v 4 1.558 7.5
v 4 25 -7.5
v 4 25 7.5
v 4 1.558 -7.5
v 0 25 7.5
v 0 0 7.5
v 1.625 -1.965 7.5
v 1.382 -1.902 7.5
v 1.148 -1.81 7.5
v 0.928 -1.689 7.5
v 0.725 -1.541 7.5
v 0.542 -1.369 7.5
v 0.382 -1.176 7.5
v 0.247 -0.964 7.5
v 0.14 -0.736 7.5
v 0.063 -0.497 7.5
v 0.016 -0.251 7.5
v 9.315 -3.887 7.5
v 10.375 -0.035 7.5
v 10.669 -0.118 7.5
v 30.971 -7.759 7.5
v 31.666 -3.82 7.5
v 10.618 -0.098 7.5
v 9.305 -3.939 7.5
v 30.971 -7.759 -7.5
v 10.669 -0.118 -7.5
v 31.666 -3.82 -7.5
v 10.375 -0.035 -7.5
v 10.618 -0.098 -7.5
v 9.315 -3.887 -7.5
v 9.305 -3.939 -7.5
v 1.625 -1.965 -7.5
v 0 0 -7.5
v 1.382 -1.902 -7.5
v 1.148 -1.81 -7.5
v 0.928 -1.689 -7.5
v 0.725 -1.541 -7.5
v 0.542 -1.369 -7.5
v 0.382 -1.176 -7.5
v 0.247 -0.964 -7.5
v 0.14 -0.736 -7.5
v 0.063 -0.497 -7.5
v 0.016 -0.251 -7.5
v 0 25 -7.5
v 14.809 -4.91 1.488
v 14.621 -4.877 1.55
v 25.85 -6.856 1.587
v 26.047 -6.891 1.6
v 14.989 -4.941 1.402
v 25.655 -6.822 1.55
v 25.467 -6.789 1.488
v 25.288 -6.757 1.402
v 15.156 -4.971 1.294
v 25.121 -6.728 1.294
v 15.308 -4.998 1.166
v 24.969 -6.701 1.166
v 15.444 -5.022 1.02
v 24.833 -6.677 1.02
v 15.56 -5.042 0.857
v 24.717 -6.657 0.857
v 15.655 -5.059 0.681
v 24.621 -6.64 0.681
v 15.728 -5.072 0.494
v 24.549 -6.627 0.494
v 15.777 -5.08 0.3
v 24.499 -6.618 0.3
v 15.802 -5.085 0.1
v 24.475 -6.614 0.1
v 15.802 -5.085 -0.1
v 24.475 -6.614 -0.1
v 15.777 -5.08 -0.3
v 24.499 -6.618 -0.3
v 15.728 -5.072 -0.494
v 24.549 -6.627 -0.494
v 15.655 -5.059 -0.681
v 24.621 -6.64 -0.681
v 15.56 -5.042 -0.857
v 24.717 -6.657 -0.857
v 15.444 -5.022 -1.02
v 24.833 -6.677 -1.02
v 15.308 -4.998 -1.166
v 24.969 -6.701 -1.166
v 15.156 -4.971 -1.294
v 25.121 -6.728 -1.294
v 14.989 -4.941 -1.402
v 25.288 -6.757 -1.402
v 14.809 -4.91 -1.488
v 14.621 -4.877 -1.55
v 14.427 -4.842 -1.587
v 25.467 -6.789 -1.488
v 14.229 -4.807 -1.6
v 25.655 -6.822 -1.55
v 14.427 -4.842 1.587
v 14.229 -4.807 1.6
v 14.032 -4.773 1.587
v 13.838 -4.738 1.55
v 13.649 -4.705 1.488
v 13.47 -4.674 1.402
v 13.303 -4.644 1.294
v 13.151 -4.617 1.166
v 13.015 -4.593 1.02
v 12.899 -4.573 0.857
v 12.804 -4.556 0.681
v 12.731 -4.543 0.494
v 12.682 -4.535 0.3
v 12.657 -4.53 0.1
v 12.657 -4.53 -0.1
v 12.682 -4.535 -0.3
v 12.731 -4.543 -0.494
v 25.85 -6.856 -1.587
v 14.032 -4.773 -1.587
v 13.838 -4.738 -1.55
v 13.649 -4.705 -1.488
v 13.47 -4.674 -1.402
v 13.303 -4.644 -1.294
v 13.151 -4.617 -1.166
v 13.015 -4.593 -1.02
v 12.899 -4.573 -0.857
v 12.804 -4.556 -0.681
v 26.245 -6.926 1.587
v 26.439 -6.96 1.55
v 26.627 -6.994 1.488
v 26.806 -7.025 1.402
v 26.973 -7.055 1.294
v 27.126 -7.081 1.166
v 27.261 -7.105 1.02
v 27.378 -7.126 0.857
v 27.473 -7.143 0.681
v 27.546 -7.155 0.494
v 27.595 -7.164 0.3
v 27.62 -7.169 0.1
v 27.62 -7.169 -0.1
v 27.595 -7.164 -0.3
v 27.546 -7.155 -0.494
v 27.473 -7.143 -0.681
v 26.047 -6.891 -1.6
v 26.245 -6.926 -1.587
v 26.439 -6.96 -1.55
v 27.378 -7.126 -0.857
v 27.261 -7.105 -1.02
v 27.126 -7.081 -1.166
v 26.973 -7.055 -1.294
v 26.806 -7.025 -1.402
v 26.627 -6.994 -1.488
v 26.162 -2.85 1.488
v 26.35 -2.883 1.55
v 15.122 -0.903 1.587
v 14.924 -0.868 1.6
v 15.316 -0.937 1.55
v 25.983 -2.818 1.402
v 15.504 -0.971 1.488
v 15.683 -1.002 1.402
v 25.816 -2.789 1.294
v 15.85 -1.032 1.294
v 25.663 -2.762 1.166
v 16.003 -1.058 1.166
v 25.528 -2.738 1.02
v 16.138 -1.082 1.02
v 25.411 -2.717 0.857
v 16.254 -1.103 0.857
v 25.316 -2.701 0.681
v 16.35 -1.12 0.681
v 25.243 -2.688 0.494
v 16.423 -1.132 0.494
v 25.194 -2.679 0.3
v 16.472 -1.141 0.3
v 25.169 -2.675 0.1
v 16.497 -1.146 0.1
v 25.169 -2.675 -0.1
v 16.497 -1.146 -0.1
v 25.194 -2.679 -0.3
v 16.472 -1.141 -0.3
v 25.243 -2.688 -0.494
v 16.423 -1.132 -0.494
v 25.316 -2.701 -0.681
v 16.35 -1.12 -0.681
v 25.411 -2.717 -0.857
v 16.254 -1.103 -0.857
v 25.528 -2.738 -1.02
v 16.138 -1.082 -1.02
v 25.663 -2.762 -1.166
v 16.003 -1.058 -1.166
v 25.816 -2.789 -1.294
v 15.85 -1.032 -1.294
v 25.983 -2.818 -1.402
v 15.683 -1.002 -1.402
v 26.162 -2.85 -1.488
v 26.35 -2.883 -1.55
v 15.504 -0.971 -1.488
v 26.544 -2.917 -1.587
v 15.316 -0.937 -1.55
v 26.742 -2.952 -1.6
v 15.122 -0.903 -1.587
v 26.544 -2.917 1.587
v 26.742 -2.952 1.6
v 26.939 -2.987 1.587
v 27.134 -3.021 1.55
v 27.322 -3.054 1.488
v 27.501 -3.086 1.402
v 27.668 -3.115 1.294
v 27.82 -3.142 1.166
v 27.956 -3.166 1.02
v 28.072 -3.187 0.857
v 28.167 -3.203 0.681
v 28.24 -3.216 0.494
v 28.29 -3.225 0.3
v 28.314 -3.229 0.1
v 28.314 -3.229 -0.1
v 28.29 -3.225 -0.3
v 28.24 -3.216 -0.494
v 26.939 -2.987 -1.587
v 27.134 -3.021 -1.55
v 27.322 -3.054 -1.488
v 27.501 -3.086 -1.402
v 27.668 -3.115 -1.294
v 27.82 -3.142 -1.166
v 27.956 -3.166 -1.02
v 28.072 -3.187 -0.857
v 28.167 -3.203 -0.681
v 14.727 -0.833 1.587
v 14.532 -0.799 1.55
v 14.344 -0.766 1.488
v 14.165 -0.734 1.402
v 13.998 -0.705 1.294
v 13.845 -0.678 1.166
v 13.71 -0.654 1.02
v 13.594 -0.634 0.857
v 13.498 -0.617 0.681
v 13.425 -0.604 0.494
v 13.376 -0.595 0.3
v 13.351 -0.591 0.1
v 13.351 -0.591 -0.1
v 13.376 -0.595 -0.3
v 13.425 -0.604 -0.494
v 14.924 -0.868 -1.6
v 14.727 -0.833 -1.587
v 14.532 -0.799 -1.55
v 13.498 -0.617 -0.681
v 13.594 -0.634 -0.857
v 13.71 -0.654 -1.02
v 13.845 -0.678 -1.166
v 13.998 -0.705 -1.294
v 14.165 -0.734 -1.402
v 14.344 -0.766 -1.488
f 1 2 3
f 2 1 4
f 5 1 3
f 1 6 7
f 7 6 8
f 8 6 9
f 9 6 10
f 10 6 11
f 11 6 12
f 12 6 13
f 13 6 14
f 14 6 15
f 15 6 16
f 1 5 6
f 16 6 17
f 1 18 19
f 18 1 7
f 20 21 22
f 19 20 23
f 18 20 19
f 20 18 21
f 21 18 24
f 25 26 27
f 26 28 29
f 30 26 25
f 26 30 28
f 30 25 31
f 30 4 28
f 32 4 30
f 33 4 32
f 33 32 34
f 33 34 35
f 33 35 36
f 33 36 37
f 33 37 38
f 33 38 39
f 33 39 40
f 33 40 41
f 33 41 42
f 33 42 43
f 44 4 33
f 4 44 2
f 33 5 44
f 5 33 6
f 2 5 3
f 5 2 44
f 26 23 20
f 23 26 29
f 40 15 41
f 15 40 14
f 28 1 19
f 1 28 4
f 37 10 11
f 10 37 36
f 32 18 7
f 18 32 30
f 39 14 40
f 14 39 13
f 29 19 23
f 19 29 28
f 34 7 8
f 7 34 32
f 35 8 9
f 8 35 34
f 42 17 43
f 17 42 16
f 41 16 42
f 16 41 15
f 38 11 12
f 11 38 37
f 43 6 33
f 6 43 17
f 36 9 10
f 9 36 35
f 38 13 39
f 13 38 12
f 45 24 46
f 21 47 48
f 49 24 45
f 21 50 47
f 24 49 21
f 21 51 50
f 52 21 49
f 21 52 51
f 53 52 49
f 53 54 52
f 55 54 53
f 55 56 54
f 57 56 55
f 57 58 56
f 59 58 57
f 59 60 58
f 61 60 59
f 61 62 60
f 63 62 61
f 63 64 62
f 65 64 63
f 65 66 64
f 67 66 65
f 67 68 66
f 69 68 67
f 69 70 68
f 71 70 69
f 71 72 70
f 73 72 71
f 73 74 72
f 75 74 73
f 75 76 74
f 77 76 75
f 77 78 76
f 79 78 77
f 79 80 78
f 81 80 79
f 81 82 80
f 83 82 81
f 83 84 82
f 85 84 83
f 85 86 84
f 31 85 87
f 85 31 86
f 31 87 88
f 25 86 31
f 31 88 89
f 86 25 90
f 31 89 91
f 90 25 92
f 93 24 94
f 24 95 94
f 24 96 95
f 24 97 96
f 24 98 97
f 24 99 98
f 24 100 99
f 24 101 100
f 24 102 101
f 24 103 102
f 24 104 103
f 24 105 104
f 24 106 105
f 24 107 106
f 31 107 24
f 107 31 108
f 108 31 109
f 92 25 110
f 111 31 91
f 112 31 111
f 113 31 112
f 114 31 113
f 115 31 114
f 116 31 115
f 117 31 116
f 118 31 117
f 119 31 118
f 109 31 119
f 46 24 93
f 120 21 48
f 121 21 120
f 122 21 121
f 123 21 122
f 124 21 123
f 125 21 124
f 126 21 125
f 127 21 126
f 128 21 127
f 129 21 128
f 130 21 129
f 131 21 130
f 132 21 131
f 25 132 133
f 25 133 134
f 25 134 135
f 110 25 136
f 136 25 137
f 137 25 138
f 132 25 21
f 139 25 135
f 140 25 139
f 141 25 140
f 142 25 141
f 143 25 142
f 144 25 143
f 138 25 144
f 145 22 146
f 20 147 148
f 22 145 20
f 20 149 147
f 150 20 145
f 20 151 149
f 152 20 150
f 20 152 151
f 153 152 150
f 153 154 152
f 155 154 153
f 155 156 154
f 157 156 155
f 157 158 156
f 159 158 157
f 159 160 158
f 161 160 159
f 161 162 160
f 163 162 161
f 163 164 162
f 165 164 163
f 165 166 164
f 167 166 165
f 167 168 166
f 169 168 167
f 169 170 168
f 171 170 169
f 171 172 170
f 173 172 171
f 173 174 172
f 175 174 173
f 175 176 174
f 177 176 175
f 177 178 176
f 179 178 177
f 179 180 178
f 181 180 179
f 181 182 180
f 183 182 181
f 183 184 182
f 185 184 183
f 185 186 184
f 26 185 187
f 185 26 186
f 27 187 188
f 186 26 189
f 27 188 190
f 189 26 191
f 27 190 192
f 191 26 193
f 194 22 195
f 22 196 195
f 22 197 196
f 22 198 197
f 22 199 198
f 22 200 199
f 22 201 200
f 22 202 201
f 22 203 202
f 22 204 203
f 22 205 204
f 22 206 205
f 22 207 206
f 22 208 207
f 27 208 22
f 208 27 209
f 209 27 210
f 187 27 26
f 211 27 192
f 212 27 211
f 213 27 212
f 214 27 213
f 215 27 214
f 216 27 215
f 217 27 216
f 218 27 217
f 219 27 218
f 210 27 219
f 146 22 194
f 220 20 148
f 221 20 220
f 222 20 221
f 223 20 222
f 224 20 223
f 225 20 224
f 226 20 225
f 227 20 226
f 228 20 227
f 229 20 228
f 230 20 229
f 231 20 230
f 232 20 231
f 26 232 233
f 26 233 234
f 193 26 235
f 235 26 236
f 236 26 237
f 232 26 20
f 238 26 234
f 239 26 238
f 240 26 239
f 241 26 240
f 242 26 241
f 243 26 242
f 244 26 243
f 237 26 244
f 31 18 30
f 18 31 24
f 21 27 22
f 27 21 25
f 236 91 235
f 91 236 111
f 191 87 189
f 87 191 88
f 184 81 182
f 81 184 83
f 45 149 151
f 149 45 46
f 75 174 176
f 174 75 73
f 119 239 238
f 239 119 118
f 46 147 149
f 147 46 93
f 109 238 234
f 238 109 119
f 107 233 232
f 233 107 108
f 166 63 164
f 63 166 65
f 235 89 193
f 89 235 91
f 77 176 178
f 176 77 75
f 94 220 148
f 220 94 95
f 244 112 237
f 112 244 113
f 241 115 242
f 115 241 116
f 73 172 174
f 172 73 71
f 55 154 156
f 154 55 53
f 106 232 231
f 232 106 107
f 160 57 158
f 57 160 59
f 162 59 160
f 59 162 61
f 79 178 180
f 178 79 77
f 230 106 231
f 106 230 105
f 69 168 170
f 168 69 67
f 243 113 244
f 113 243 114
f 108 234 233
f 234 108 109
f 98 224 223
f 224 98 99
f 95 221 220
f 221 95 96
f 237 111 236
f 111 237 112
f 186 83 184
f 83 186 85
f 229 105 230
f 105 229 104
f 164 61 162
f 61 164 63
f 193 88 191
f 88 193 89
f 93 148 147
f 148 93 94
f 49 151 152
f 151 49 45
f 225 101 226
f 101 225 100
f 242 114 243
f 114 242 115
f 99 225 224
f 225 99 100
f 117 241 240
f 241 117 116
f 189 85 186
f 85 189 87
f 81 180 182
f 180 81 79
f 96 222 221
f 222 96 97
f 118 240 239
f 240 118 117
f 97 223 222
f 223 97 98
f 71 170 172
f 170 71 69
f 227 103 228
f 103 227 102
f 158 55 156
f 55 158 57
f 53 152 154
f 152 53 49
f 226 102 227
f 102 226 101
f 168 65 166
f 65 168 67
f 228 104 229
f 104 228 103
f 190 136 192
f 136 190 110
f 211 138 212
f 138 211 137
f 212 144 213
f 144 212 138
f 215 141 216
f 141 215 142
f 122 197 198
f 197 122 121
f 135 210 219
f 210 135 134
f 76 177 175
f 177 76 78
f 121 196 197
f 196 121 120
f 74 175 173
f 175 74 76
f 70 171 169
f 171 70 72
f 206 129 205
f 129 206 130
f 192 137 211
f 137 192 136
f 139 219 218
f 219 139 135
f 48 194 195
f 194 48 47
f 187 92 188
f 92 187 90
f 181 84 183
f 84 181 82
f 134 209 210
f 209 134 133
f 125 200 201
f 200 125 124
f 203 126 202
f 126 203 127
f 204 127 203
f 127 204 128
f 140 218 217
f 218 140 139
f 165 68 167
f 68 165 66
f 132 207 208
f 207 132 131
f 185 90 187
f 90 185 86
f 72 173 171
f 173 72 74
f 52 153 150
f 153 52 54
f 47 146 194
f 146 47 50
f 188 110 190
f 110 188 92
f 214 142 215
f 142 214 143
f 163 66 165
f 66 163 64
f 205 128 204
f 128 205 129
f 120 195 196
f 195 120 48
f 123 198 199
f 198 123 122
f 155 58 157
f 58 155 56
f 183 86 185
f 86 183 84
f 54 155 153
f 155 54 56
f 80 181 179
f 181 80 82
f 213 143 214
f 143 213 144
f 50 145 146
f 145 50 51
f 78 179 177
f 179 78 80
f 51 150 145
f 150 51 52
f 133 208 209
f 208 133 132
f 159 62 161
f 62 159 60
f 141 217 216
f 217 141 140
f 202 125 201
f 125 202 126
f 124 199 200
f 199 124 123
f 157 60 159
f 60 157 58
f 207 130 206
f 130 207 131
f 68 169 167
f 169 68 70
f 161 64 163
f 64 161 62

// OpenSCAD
// file: ../parameters.scad
global_clearance = 0.5;

layer_thickness = 0.3;

//Main tube diameter - hole [mm]
main_tube_outer_diameter = 25.4;
main_tube_inner_diameter = 23.05;

// Nastavení parametrů rotoru

gliding_aggle = 14;         // tenhle úhel by se zřejmě v budoucnu měl počítat z požadované klouzavosti.

rotor_blade_AOA = 1.5;      // nastavení úhlu náběhu rotorového listu

// Rotor Auto-G2
rotor_blade_rod = true;  // generovat diru pro uhlikove tycky
rotor_blade_length = 400 - 15;   // délka rotorového listu
rotor_blade_depth = 45.5;     // hloubka rotorového listu


blade_mount_length = 30;

blade_mount_width = 17;
blade_mount_thickness = 4.6;
blade_mount_screw_offset = 5; // distance of first screw from rotor end

// Testovaci maly rotor

        /*
        rotor_blade_rod = false;
        rotor_blade_length = 145;   // délka rotorového listu
        rotor_blade_depth = 45.5 * (145/385);     // hloubka rotorového listu
        blade_mount_length = 20;
        blade_mount_width = 10;
        blade_mount_thickness = 4;
        */

// konec parametru pro testovaci maly rotor

rotor_height = 180;         // výška otočného kloubu rotoru nad hlavní trubkou vírníku (odhad)
rotor_blades_count = 2;
rotor_delta_angle = 12;
rotor_blade_thickness = 5.1;

rotor_blade_naca = 2412;
rotor_blade_parts_count = 3;

blade_transition_length = 10; // length of blade transition

blade_mount_screw_distance = (16.47+11.86)/2;

/* blade_shell_thickness = 0.4;
blade_shell_thickness_inner = 0.4;
blade_shell_thickness_wire = 0.4;
blade_infill_distance = 25;
blade_infill_overlap = 0; */

/// Nastaveni pro Slic3r
blade_shell_thickness = 0.45;
blade_shell_thickness_inner = 0.43;
blade_shell_thickness_wire = 0.45;
blade_infill_distance = 20;
blade_infill_overlap = 0;


//blade_rod_position = [rotor_blade_depth/4 + 5, 0, 0];
//blade_rod_position2 = [rotor_blade_depth/4 - 5, 0, 0];

//blade_rod_position = [15, 0, 0];
//blade_rod_position2 = [4, 0.3, 0];

blade_rod1_diameter = 2.58;
blade_rod2_diameter = 2.58;
blade_rod3_diameter = 2.13;

blade_rod1_position = [3.4, 0.3, 0];
blade_rod2_position = [rotor_blade_depth/4 - 4, 0.2, 0];
blade_rod3_position = [rotor_blade_depth/4 + 3.5, 0, 0];


rotor_head_width =  21.4;    //Rozměr 1 v nákresu
pilon_wall_thickness = 4.2;  // Rozměr 2 v nákresu
horizontal_screw_distance = 14.5;   // Rozměr 4 v nákresu
vertical_screw_distance = 12;       // rozměr 5 v nkresu
topscrew_distance_endofpilon = 5;

rotorhead_wall_thickness = 2; // sila tistenych dilu


bearing_outer_diameter = 10.2;    // Rozměr B1 v nákresu s přídavkem na toleranci otvoru
bearing_thickness = 4;        // Rozměr B2 v nákresu
//bearing_shaft_length = 19.5;    // Rozměr B3 v nákresu, Originalni hodnota 19.5
bearing_shaft_length = 20;    // Rozměr B3 v nákresu


// nastavení parametrů motoru

engine_angle = -8;
engine_diameter = 55;
engine_offset = 55;

engine_screws_radius = 15;
engine_holes_radius = (24 + 44)/4;
engine_shatf_hole_diameter = 13;

// screw length step - minimum difference in length between two types of screws
basic_screw_length = 5;

//Screw diameter and nut for M6 [mm]
M6_screw_diameter=6.5;
M6_head_diameter = 10+0.5;
M6_head_height = 6;
M6_nut_height = 4.9;
M6_nut_diameter = 11.8;
M6_nut_pocket = 10.4;

//Screw diameter and nut for M5 [mm]
M5_screw_diameter=5.5;
M5_head_height = 5;
M5_head_diameter = 13+0.5;
M5_nut_height = 4.5;
M5_nut_diameter = 9.4;
M5_nut_pocket = 8.4;

//Screw diameter and nut for M4 [mm]
M4_screw_diameter=4.5;
M4_screw_head_height = 4;
M4_nut_height = 3.2;
M4_nut_diameter = 8.4;
M4_nut_pocket = 7.5;

//Screw diameter and nut for M3 [mm]
M3_screw_diameter = 3.2;
M3_nut_height = 2.7;
M3_nut_diameter = 6.6;
M3_screw_head_height = 3;
M3_nut_pocket = 5.6;


//Screw diameter and nut for M2,5 [mm]
M2_5_screw_diameter = 2.7;
M2_5_nut_height = 2.3;
M2_5_nut_diameter = 6;
M2_5_nut_pocket = 5.1;

//Screw diameter and nut for M2 [mm]
M2_screw_diameter = 2.0;
M2_nut_height = 1.8;
M2_nut_diameter = 4.8;
M2_nut_pocket = 3.95;


blade_mount_screw = M2_screw_diameter;
blade_mount_nut = M2_nut_diameter;


//šroub servo
Servo_screw = 1.5;
Servo_nut_height = 1;
Servo_nut_diameter = 2.7;

tail_pipes_distance = 10.16*5;
tail_pipes_diameter = M4_screw_diameter;
tail_pipes_min_wall = 3;

//center_of_gravity_position = [main_pilon_position - tan(gliding_aggle)*rotor_height, 0, 0];


base_patern = 10.16;
////podzvozek

radius_undercarriage = 25;
vzdalenost_x = tan(20) * 131;
vzdalenost_y = (131 - radius_undercarriage)/tan(79);
uhel_y = 90 - 20;
uhel_x = 90 - 79;

maximum_printable_size = 150;


////Pitotova trubice
Pitot_tube_diameter = 4.02 + 1;
Distance_hole_from_tube = 11.92;  //vzdálenost otvoru pro připevnění od samotné trubičky


////Vlečné zařízení
tow_ring_diameter = 20;
tow_ring_thickness = 5;
tow_ring_groove = 2;
tow_ring_hole_diameter = M3_screw_diameter;

////Simoniny parametry pro nosník rotoru
base_length = 290; //delka podlozky
base_split_position = [0, 145, base_length];
base_width = 60; //sirka podlozky - vnější šířka nosníku
base_thickness = 4; //vyska podlozky
base_patern = 10;
rantl_thickness = 4; //sirka steny podlozky
rantl_height = 8;
niy=4; //pocet der podelne
// main file
include <../parameters.scad>

$fn = 50;
suspension_depth = 15;
suspension_holder_flange_height = 25;
suspension_holder_thickness = 4;

suspension_join_length = 22;
suspension_join_screw_distance = 12;



module 888_2001(){

    difference(){
        union(){
            translate([0, 0, -suspension_depth/2])
                cube([suspension_holder_thickness, suspension_holder_flange_height, suspension_depth]);

            hull(){
                translate([2, 0, 0])
                    cylinder(d = suspension_holder_thickness, h = suspension_depth, center = true);
                translate([0, -2, 0] + [10, 0, 0])
                    cylinder(d = suspension_holder_thickness, h = suspension_depth, center = true);

            }

            translate([10, 0, 0])
                rotate([0, 0, -90-10])
                    translate([0, 0, -suspension_depth/2])
                        cube([suspension_holder_thickness, suspension_join_length, suspension_depth]);
        }

        translate([10, 0, 0])
            rotate([0, 0, -90-10])
                translate([0, 0, 0])
                    for (i=[1,-1])
                        translate([0, suspension_join_length/2-i*suspension_join_screw_distance/2, 00])
                            rotate([0, 90, 0])
                                cylinder(d=M3_screw_diameter, h = 10, center = true);




    }

}


888_2001();
